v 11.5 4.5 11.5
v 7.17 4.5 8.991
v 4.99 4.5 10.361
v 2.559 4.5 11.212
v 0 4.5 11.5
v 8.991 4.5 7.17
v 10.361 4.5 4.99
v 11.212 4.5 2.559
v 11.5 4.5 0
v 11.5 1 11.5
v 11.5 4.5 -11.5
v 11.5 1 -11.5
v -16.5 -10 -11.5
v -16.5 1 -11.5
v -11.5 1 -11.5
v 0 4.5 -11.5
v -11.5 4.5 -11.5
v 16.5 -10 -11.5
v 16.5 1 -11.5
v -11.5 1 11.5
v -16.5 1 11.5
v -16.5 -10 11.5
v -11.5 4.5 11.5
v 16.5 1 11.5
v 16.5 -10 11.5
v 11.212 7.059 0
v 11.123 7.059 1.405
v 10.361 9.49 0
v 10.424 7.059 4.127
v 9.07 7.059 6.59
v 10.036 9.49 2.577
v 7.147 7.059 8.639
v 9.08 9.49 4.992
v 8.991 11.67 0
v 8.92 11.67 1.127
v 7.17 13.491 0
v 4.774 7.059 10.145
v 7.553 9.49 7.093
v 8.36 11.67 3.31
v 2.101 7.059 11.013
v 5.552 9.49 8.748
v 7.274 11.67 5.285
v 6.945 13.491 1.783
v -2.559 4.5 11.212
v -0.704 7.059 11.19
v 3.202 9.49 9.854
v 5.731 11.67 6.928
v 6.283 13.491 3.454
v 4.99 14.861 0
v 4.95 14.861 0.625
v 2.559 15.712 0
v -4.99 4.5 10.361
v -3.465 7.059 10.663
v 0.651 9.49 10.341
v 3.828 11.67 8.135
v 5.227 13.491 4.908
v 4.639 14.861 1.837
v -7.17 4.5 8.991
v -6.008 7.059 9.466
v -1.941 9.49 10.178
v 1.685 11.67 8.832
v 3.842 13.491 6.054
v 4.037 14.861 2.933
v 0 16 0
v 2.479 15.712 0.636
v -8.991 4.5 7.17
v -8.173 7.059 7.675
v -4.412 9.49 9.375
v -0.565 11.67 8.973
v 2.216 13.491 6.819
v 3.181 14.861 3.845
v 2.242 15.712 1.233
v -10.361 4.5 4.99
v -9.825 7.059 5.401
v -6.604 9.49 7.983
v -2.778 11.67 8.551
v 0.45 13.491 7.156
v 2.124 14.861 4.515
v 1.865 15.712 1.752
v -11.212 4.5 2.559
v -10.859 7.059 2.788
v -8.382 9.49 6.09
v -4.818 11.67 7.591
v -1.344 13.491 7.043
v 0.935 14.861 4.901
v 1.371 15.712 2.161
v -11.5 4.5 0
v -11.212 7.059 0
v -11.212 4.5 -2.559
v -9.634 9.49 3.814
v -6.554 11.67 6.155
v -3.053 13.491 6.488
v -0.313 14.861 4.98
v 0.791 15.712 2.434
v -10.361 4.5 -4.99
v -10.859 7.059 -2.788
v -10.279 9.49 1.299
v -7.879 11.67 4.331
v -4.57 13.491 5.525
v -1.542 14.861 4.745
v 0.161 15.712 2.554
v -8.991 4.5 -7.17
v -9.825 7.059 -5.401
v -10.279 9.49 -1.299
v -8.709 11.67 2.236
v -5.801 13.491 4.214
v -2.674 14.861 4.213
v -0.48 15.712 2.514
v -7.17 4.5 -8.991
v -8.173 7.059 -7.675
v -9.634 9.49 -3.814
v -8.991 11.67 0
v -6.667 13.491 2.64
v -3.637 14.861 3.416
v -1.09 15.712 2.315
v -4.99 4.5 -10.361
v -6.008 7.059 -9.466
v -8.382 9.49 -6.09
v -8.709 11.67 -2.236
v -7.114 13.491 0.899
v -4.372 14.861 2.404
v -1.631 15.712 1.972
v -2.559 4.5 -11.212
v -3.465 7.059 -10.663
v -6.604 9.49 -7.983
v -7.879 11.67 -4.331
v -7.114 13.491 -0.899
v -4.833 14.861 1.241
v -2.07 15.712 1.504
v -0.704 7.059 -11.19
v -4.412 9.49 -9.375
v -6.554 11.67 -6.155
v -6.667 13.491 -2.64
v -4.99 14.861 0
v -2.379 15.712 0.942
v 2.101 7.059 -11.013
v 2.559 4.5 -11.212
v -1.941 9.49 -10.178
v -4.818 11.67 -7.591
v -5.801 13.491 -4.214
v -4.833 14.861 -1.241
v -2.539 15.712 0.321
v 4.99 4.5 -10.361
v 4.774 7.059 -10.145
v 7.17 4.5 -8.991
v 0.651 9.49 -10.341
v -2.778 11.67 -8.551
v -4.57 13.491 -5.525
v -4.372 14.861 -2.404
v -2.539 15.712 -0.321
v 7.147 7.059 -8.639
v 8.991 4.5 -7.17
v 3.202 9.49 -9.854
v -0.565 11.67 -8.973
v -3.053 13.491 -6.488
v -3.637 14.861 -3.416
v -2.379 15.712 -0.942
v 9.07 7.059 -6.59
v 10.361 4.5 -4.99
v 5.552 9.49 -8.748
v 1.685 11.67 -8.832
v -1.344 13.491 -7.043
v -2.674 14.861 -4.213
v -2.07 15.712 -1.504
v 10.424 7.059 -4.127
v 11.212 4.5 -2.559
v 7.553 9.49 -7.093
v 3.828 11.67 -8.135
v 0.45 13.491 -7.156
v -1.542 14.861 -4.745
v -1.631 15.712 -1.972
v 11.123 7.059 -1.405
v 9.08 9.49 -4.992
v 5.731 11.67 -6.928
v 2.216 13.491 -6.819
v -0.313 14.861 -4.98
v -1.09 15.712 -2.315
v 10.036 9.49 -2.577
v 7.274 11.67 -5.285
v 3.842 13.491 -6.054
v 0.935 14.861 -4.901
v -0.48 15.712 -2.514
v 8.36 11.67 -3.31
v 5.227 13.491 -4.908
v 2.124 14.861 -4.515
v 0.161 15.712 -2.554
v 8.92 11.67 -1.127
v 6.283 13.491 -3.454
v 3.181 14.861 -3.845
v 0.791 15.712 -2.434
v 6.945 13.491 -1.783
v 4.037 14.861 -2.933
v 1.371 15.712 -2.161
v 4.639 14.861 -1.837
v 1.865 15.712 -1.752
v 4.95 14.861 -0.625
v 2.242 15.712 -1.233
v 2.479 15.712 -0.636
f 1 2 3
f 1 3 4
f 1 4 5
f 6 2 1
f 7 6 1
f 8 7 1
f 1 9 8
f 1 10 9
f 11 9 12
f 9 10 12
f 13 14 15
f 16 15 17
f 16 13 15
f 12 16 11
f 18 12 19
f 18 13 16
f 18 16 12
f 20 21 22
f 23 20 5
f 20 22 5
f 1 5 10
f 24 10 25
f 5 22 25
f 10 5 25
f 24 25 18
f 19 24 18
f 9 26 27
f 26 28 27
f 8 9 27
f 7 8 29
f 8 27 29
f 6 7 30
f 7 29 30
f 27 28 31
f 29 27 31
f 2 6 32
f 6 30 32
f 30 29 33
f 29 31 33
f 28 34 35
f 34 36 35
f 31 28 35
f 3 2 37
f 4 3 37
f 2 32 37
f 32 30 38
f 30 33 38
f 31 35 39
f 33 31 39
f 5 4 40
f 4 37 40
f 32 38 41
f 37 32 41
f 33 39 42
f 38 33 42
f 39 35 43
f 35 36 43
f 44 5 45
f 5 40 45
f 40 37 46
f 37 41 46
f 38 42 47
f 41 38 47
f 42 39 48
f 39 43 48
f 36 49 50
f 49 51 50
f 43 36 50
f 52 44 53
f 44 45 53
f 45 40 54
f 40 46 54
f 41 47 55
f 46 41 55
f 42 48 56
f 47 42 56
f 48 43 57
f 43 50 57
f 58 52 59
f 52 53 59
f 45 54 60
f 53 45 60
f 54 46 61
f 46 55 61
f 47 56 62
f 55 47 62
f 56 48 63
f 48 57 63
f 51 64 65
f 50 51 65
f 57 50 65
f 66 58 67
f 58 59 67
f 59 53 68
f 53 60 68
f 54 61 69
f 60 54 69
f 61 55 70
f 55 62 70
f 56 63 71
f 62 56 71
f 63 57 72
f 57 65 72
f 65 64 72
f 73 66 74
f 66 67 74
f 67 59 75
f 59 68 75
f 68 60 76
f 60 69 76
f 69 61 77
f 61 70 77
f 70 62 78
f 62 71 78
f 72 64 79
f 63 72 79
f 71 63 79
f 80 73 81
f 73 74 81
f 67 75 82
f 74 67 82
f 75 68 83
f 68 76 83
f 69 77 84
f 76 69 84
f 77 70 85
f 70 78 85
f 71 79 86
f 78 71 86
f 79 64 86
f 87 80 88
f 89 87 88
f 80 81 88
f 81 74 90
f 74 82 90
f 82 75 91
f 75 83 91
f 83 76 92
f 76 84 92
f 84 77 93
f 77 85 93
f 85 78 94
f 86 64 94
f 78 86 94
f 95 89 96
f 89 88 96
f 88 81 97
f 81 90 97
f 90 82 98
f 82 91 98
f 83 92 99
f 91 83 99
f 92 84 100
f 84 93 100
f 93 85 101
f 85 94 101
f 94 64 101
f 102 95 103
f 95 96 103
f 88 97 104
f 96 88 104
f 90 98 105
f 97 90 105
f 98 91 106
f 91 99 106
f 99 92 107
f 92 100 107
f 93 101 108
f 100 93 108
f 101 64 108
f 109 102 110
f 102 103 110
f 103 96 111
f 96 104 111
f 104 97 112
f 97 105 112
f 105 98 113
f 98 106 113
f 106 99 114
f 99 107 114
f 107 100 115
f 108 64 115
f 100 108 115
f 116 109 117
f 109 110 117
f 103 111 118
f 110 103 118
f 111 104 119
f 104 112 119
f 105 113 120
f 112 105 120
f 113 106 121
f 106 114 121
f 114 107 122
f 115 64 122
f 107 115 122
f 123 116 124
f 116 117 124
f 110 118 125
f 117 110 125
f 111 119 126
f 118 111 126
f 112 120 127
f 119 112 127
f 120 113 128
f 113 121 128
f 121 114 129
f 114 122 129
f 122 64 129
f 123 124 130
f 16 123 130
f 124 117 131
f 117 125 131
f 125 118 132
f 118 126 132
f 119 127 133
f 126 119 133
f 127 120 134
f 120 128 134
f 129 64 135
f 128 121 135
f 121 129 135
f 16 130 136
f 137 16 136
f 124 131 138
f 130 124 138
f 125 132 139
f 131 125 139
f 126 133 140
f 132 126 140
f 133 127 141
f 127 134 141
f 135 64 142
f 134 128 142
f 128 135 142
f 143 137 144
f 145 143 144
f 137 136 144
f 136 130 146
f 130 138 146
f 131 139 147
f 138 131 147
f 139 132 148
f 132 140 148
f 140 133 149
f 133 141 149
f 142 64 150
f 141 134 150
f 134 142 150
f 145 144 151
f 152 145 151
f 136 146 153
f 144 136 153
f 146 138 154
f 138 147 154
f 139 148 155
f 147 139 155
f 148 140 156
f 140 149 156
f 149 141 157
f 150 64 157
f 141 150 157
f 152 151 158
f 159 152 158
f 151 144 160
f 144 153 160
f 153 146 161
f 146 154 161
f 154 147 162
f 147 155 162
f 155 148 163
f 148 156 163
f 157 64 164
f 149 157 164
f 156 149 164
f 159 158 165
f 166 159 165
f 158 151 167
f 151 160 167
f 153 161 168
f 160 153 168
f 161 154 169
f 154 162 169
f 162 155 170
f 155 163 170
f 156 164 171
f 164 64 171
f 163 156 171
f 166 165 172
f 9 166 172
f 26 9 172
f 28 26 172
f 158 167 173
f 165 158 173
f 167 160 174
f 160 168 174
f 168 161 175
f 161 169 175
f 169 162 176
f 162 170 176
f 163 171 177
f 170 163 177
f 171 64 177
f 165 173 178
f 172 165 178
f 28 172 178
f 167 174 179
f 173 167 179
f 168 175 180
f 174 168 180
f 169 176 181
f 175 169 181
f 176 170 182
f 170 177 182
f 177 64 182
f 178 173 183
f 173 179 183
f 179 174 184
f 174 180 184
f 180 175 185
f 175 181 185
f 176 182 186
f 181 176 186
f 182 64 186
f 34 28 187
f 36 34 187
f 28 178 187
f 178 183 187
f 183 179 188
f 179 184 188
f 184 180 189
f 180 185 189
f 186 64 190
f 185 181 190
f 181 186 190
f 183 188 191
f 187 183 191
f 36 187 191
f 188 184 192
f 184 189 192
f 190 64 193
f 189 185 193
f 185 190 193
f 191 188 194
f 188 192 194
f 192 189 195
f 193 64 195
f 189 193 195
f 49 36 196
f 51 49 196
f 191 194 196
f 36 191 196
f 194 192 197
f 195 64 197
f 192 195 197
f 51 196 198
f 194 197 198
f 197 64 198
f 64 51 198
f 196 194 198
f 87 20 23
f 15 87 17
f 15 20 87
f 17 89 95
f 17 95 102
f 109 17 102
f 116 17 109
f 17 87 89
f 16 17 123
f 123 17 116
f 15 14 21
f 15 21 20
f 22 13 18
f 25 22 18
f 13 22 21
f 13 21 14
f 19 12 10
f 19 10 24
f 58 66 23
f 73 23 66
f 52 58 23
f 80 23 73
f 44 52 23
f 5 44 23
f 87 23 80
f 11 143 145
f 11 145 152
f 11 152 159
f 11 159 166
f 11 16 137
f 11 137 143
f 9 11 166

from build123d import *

# Parameters (mm, degrees)
BOSS_EXTRUDE1_DEPTH      = 1
BOSS_EXTRUDE1_DEPTH_BACK = 10
SKETCH1_W                = 33
SKETCH1_H                = 23
SKETCH2_W                = 23
SKETCH2_H                = 23
BOSS_EXTRUDE2_DEPTH      = 3.5


with BuildPart() as part:
    # Sketch1 → Boss-Extrude1 (new, two sides: drawn at the far end of the back side and taken through both)
    with BuildSketch(Plane(origin=(0, 0, 0), x_dir=(1, 0, 0), z_dir=(0, 1, 0)).offset(-BOSS_EXTRUDE1_DEPTH_BACK)):
        Rectangle(SKETCH1_W, SKETCH1_H)
    extrude(amount=BOSS_EXTRUDE1_DEPTH + BOSS_EXTRUDE1_DEPTH_BACK)

    # Sketch2 → Boss-Extrude2 (add)
    with BuildSketch(Plane(origin=(0, 1, 0), x_dir=(1, 0, 0), z_dir=(0, 1, 0))):
        Rectangle(SKETCH2_W, SKETCH2_H)
    extrude(amount=BOSS_EXTRUDE2_DEPTH)

    # Sketch3 → Revolve1 (revolve)
    with BuildSketch(Plane.XY):
        with BuildLine():
            Line((0, 4.5), (11.5, 4.5))
            ThreePointArc((11.5, 4.5), (8.131727984, 12.631727984), (0, 16))
            Line((0, 16), (0, 4.5))
        make_face()
    revolve(axis=Axis((0, 16, 0), (0, -1, 0)))


solid = part.part
